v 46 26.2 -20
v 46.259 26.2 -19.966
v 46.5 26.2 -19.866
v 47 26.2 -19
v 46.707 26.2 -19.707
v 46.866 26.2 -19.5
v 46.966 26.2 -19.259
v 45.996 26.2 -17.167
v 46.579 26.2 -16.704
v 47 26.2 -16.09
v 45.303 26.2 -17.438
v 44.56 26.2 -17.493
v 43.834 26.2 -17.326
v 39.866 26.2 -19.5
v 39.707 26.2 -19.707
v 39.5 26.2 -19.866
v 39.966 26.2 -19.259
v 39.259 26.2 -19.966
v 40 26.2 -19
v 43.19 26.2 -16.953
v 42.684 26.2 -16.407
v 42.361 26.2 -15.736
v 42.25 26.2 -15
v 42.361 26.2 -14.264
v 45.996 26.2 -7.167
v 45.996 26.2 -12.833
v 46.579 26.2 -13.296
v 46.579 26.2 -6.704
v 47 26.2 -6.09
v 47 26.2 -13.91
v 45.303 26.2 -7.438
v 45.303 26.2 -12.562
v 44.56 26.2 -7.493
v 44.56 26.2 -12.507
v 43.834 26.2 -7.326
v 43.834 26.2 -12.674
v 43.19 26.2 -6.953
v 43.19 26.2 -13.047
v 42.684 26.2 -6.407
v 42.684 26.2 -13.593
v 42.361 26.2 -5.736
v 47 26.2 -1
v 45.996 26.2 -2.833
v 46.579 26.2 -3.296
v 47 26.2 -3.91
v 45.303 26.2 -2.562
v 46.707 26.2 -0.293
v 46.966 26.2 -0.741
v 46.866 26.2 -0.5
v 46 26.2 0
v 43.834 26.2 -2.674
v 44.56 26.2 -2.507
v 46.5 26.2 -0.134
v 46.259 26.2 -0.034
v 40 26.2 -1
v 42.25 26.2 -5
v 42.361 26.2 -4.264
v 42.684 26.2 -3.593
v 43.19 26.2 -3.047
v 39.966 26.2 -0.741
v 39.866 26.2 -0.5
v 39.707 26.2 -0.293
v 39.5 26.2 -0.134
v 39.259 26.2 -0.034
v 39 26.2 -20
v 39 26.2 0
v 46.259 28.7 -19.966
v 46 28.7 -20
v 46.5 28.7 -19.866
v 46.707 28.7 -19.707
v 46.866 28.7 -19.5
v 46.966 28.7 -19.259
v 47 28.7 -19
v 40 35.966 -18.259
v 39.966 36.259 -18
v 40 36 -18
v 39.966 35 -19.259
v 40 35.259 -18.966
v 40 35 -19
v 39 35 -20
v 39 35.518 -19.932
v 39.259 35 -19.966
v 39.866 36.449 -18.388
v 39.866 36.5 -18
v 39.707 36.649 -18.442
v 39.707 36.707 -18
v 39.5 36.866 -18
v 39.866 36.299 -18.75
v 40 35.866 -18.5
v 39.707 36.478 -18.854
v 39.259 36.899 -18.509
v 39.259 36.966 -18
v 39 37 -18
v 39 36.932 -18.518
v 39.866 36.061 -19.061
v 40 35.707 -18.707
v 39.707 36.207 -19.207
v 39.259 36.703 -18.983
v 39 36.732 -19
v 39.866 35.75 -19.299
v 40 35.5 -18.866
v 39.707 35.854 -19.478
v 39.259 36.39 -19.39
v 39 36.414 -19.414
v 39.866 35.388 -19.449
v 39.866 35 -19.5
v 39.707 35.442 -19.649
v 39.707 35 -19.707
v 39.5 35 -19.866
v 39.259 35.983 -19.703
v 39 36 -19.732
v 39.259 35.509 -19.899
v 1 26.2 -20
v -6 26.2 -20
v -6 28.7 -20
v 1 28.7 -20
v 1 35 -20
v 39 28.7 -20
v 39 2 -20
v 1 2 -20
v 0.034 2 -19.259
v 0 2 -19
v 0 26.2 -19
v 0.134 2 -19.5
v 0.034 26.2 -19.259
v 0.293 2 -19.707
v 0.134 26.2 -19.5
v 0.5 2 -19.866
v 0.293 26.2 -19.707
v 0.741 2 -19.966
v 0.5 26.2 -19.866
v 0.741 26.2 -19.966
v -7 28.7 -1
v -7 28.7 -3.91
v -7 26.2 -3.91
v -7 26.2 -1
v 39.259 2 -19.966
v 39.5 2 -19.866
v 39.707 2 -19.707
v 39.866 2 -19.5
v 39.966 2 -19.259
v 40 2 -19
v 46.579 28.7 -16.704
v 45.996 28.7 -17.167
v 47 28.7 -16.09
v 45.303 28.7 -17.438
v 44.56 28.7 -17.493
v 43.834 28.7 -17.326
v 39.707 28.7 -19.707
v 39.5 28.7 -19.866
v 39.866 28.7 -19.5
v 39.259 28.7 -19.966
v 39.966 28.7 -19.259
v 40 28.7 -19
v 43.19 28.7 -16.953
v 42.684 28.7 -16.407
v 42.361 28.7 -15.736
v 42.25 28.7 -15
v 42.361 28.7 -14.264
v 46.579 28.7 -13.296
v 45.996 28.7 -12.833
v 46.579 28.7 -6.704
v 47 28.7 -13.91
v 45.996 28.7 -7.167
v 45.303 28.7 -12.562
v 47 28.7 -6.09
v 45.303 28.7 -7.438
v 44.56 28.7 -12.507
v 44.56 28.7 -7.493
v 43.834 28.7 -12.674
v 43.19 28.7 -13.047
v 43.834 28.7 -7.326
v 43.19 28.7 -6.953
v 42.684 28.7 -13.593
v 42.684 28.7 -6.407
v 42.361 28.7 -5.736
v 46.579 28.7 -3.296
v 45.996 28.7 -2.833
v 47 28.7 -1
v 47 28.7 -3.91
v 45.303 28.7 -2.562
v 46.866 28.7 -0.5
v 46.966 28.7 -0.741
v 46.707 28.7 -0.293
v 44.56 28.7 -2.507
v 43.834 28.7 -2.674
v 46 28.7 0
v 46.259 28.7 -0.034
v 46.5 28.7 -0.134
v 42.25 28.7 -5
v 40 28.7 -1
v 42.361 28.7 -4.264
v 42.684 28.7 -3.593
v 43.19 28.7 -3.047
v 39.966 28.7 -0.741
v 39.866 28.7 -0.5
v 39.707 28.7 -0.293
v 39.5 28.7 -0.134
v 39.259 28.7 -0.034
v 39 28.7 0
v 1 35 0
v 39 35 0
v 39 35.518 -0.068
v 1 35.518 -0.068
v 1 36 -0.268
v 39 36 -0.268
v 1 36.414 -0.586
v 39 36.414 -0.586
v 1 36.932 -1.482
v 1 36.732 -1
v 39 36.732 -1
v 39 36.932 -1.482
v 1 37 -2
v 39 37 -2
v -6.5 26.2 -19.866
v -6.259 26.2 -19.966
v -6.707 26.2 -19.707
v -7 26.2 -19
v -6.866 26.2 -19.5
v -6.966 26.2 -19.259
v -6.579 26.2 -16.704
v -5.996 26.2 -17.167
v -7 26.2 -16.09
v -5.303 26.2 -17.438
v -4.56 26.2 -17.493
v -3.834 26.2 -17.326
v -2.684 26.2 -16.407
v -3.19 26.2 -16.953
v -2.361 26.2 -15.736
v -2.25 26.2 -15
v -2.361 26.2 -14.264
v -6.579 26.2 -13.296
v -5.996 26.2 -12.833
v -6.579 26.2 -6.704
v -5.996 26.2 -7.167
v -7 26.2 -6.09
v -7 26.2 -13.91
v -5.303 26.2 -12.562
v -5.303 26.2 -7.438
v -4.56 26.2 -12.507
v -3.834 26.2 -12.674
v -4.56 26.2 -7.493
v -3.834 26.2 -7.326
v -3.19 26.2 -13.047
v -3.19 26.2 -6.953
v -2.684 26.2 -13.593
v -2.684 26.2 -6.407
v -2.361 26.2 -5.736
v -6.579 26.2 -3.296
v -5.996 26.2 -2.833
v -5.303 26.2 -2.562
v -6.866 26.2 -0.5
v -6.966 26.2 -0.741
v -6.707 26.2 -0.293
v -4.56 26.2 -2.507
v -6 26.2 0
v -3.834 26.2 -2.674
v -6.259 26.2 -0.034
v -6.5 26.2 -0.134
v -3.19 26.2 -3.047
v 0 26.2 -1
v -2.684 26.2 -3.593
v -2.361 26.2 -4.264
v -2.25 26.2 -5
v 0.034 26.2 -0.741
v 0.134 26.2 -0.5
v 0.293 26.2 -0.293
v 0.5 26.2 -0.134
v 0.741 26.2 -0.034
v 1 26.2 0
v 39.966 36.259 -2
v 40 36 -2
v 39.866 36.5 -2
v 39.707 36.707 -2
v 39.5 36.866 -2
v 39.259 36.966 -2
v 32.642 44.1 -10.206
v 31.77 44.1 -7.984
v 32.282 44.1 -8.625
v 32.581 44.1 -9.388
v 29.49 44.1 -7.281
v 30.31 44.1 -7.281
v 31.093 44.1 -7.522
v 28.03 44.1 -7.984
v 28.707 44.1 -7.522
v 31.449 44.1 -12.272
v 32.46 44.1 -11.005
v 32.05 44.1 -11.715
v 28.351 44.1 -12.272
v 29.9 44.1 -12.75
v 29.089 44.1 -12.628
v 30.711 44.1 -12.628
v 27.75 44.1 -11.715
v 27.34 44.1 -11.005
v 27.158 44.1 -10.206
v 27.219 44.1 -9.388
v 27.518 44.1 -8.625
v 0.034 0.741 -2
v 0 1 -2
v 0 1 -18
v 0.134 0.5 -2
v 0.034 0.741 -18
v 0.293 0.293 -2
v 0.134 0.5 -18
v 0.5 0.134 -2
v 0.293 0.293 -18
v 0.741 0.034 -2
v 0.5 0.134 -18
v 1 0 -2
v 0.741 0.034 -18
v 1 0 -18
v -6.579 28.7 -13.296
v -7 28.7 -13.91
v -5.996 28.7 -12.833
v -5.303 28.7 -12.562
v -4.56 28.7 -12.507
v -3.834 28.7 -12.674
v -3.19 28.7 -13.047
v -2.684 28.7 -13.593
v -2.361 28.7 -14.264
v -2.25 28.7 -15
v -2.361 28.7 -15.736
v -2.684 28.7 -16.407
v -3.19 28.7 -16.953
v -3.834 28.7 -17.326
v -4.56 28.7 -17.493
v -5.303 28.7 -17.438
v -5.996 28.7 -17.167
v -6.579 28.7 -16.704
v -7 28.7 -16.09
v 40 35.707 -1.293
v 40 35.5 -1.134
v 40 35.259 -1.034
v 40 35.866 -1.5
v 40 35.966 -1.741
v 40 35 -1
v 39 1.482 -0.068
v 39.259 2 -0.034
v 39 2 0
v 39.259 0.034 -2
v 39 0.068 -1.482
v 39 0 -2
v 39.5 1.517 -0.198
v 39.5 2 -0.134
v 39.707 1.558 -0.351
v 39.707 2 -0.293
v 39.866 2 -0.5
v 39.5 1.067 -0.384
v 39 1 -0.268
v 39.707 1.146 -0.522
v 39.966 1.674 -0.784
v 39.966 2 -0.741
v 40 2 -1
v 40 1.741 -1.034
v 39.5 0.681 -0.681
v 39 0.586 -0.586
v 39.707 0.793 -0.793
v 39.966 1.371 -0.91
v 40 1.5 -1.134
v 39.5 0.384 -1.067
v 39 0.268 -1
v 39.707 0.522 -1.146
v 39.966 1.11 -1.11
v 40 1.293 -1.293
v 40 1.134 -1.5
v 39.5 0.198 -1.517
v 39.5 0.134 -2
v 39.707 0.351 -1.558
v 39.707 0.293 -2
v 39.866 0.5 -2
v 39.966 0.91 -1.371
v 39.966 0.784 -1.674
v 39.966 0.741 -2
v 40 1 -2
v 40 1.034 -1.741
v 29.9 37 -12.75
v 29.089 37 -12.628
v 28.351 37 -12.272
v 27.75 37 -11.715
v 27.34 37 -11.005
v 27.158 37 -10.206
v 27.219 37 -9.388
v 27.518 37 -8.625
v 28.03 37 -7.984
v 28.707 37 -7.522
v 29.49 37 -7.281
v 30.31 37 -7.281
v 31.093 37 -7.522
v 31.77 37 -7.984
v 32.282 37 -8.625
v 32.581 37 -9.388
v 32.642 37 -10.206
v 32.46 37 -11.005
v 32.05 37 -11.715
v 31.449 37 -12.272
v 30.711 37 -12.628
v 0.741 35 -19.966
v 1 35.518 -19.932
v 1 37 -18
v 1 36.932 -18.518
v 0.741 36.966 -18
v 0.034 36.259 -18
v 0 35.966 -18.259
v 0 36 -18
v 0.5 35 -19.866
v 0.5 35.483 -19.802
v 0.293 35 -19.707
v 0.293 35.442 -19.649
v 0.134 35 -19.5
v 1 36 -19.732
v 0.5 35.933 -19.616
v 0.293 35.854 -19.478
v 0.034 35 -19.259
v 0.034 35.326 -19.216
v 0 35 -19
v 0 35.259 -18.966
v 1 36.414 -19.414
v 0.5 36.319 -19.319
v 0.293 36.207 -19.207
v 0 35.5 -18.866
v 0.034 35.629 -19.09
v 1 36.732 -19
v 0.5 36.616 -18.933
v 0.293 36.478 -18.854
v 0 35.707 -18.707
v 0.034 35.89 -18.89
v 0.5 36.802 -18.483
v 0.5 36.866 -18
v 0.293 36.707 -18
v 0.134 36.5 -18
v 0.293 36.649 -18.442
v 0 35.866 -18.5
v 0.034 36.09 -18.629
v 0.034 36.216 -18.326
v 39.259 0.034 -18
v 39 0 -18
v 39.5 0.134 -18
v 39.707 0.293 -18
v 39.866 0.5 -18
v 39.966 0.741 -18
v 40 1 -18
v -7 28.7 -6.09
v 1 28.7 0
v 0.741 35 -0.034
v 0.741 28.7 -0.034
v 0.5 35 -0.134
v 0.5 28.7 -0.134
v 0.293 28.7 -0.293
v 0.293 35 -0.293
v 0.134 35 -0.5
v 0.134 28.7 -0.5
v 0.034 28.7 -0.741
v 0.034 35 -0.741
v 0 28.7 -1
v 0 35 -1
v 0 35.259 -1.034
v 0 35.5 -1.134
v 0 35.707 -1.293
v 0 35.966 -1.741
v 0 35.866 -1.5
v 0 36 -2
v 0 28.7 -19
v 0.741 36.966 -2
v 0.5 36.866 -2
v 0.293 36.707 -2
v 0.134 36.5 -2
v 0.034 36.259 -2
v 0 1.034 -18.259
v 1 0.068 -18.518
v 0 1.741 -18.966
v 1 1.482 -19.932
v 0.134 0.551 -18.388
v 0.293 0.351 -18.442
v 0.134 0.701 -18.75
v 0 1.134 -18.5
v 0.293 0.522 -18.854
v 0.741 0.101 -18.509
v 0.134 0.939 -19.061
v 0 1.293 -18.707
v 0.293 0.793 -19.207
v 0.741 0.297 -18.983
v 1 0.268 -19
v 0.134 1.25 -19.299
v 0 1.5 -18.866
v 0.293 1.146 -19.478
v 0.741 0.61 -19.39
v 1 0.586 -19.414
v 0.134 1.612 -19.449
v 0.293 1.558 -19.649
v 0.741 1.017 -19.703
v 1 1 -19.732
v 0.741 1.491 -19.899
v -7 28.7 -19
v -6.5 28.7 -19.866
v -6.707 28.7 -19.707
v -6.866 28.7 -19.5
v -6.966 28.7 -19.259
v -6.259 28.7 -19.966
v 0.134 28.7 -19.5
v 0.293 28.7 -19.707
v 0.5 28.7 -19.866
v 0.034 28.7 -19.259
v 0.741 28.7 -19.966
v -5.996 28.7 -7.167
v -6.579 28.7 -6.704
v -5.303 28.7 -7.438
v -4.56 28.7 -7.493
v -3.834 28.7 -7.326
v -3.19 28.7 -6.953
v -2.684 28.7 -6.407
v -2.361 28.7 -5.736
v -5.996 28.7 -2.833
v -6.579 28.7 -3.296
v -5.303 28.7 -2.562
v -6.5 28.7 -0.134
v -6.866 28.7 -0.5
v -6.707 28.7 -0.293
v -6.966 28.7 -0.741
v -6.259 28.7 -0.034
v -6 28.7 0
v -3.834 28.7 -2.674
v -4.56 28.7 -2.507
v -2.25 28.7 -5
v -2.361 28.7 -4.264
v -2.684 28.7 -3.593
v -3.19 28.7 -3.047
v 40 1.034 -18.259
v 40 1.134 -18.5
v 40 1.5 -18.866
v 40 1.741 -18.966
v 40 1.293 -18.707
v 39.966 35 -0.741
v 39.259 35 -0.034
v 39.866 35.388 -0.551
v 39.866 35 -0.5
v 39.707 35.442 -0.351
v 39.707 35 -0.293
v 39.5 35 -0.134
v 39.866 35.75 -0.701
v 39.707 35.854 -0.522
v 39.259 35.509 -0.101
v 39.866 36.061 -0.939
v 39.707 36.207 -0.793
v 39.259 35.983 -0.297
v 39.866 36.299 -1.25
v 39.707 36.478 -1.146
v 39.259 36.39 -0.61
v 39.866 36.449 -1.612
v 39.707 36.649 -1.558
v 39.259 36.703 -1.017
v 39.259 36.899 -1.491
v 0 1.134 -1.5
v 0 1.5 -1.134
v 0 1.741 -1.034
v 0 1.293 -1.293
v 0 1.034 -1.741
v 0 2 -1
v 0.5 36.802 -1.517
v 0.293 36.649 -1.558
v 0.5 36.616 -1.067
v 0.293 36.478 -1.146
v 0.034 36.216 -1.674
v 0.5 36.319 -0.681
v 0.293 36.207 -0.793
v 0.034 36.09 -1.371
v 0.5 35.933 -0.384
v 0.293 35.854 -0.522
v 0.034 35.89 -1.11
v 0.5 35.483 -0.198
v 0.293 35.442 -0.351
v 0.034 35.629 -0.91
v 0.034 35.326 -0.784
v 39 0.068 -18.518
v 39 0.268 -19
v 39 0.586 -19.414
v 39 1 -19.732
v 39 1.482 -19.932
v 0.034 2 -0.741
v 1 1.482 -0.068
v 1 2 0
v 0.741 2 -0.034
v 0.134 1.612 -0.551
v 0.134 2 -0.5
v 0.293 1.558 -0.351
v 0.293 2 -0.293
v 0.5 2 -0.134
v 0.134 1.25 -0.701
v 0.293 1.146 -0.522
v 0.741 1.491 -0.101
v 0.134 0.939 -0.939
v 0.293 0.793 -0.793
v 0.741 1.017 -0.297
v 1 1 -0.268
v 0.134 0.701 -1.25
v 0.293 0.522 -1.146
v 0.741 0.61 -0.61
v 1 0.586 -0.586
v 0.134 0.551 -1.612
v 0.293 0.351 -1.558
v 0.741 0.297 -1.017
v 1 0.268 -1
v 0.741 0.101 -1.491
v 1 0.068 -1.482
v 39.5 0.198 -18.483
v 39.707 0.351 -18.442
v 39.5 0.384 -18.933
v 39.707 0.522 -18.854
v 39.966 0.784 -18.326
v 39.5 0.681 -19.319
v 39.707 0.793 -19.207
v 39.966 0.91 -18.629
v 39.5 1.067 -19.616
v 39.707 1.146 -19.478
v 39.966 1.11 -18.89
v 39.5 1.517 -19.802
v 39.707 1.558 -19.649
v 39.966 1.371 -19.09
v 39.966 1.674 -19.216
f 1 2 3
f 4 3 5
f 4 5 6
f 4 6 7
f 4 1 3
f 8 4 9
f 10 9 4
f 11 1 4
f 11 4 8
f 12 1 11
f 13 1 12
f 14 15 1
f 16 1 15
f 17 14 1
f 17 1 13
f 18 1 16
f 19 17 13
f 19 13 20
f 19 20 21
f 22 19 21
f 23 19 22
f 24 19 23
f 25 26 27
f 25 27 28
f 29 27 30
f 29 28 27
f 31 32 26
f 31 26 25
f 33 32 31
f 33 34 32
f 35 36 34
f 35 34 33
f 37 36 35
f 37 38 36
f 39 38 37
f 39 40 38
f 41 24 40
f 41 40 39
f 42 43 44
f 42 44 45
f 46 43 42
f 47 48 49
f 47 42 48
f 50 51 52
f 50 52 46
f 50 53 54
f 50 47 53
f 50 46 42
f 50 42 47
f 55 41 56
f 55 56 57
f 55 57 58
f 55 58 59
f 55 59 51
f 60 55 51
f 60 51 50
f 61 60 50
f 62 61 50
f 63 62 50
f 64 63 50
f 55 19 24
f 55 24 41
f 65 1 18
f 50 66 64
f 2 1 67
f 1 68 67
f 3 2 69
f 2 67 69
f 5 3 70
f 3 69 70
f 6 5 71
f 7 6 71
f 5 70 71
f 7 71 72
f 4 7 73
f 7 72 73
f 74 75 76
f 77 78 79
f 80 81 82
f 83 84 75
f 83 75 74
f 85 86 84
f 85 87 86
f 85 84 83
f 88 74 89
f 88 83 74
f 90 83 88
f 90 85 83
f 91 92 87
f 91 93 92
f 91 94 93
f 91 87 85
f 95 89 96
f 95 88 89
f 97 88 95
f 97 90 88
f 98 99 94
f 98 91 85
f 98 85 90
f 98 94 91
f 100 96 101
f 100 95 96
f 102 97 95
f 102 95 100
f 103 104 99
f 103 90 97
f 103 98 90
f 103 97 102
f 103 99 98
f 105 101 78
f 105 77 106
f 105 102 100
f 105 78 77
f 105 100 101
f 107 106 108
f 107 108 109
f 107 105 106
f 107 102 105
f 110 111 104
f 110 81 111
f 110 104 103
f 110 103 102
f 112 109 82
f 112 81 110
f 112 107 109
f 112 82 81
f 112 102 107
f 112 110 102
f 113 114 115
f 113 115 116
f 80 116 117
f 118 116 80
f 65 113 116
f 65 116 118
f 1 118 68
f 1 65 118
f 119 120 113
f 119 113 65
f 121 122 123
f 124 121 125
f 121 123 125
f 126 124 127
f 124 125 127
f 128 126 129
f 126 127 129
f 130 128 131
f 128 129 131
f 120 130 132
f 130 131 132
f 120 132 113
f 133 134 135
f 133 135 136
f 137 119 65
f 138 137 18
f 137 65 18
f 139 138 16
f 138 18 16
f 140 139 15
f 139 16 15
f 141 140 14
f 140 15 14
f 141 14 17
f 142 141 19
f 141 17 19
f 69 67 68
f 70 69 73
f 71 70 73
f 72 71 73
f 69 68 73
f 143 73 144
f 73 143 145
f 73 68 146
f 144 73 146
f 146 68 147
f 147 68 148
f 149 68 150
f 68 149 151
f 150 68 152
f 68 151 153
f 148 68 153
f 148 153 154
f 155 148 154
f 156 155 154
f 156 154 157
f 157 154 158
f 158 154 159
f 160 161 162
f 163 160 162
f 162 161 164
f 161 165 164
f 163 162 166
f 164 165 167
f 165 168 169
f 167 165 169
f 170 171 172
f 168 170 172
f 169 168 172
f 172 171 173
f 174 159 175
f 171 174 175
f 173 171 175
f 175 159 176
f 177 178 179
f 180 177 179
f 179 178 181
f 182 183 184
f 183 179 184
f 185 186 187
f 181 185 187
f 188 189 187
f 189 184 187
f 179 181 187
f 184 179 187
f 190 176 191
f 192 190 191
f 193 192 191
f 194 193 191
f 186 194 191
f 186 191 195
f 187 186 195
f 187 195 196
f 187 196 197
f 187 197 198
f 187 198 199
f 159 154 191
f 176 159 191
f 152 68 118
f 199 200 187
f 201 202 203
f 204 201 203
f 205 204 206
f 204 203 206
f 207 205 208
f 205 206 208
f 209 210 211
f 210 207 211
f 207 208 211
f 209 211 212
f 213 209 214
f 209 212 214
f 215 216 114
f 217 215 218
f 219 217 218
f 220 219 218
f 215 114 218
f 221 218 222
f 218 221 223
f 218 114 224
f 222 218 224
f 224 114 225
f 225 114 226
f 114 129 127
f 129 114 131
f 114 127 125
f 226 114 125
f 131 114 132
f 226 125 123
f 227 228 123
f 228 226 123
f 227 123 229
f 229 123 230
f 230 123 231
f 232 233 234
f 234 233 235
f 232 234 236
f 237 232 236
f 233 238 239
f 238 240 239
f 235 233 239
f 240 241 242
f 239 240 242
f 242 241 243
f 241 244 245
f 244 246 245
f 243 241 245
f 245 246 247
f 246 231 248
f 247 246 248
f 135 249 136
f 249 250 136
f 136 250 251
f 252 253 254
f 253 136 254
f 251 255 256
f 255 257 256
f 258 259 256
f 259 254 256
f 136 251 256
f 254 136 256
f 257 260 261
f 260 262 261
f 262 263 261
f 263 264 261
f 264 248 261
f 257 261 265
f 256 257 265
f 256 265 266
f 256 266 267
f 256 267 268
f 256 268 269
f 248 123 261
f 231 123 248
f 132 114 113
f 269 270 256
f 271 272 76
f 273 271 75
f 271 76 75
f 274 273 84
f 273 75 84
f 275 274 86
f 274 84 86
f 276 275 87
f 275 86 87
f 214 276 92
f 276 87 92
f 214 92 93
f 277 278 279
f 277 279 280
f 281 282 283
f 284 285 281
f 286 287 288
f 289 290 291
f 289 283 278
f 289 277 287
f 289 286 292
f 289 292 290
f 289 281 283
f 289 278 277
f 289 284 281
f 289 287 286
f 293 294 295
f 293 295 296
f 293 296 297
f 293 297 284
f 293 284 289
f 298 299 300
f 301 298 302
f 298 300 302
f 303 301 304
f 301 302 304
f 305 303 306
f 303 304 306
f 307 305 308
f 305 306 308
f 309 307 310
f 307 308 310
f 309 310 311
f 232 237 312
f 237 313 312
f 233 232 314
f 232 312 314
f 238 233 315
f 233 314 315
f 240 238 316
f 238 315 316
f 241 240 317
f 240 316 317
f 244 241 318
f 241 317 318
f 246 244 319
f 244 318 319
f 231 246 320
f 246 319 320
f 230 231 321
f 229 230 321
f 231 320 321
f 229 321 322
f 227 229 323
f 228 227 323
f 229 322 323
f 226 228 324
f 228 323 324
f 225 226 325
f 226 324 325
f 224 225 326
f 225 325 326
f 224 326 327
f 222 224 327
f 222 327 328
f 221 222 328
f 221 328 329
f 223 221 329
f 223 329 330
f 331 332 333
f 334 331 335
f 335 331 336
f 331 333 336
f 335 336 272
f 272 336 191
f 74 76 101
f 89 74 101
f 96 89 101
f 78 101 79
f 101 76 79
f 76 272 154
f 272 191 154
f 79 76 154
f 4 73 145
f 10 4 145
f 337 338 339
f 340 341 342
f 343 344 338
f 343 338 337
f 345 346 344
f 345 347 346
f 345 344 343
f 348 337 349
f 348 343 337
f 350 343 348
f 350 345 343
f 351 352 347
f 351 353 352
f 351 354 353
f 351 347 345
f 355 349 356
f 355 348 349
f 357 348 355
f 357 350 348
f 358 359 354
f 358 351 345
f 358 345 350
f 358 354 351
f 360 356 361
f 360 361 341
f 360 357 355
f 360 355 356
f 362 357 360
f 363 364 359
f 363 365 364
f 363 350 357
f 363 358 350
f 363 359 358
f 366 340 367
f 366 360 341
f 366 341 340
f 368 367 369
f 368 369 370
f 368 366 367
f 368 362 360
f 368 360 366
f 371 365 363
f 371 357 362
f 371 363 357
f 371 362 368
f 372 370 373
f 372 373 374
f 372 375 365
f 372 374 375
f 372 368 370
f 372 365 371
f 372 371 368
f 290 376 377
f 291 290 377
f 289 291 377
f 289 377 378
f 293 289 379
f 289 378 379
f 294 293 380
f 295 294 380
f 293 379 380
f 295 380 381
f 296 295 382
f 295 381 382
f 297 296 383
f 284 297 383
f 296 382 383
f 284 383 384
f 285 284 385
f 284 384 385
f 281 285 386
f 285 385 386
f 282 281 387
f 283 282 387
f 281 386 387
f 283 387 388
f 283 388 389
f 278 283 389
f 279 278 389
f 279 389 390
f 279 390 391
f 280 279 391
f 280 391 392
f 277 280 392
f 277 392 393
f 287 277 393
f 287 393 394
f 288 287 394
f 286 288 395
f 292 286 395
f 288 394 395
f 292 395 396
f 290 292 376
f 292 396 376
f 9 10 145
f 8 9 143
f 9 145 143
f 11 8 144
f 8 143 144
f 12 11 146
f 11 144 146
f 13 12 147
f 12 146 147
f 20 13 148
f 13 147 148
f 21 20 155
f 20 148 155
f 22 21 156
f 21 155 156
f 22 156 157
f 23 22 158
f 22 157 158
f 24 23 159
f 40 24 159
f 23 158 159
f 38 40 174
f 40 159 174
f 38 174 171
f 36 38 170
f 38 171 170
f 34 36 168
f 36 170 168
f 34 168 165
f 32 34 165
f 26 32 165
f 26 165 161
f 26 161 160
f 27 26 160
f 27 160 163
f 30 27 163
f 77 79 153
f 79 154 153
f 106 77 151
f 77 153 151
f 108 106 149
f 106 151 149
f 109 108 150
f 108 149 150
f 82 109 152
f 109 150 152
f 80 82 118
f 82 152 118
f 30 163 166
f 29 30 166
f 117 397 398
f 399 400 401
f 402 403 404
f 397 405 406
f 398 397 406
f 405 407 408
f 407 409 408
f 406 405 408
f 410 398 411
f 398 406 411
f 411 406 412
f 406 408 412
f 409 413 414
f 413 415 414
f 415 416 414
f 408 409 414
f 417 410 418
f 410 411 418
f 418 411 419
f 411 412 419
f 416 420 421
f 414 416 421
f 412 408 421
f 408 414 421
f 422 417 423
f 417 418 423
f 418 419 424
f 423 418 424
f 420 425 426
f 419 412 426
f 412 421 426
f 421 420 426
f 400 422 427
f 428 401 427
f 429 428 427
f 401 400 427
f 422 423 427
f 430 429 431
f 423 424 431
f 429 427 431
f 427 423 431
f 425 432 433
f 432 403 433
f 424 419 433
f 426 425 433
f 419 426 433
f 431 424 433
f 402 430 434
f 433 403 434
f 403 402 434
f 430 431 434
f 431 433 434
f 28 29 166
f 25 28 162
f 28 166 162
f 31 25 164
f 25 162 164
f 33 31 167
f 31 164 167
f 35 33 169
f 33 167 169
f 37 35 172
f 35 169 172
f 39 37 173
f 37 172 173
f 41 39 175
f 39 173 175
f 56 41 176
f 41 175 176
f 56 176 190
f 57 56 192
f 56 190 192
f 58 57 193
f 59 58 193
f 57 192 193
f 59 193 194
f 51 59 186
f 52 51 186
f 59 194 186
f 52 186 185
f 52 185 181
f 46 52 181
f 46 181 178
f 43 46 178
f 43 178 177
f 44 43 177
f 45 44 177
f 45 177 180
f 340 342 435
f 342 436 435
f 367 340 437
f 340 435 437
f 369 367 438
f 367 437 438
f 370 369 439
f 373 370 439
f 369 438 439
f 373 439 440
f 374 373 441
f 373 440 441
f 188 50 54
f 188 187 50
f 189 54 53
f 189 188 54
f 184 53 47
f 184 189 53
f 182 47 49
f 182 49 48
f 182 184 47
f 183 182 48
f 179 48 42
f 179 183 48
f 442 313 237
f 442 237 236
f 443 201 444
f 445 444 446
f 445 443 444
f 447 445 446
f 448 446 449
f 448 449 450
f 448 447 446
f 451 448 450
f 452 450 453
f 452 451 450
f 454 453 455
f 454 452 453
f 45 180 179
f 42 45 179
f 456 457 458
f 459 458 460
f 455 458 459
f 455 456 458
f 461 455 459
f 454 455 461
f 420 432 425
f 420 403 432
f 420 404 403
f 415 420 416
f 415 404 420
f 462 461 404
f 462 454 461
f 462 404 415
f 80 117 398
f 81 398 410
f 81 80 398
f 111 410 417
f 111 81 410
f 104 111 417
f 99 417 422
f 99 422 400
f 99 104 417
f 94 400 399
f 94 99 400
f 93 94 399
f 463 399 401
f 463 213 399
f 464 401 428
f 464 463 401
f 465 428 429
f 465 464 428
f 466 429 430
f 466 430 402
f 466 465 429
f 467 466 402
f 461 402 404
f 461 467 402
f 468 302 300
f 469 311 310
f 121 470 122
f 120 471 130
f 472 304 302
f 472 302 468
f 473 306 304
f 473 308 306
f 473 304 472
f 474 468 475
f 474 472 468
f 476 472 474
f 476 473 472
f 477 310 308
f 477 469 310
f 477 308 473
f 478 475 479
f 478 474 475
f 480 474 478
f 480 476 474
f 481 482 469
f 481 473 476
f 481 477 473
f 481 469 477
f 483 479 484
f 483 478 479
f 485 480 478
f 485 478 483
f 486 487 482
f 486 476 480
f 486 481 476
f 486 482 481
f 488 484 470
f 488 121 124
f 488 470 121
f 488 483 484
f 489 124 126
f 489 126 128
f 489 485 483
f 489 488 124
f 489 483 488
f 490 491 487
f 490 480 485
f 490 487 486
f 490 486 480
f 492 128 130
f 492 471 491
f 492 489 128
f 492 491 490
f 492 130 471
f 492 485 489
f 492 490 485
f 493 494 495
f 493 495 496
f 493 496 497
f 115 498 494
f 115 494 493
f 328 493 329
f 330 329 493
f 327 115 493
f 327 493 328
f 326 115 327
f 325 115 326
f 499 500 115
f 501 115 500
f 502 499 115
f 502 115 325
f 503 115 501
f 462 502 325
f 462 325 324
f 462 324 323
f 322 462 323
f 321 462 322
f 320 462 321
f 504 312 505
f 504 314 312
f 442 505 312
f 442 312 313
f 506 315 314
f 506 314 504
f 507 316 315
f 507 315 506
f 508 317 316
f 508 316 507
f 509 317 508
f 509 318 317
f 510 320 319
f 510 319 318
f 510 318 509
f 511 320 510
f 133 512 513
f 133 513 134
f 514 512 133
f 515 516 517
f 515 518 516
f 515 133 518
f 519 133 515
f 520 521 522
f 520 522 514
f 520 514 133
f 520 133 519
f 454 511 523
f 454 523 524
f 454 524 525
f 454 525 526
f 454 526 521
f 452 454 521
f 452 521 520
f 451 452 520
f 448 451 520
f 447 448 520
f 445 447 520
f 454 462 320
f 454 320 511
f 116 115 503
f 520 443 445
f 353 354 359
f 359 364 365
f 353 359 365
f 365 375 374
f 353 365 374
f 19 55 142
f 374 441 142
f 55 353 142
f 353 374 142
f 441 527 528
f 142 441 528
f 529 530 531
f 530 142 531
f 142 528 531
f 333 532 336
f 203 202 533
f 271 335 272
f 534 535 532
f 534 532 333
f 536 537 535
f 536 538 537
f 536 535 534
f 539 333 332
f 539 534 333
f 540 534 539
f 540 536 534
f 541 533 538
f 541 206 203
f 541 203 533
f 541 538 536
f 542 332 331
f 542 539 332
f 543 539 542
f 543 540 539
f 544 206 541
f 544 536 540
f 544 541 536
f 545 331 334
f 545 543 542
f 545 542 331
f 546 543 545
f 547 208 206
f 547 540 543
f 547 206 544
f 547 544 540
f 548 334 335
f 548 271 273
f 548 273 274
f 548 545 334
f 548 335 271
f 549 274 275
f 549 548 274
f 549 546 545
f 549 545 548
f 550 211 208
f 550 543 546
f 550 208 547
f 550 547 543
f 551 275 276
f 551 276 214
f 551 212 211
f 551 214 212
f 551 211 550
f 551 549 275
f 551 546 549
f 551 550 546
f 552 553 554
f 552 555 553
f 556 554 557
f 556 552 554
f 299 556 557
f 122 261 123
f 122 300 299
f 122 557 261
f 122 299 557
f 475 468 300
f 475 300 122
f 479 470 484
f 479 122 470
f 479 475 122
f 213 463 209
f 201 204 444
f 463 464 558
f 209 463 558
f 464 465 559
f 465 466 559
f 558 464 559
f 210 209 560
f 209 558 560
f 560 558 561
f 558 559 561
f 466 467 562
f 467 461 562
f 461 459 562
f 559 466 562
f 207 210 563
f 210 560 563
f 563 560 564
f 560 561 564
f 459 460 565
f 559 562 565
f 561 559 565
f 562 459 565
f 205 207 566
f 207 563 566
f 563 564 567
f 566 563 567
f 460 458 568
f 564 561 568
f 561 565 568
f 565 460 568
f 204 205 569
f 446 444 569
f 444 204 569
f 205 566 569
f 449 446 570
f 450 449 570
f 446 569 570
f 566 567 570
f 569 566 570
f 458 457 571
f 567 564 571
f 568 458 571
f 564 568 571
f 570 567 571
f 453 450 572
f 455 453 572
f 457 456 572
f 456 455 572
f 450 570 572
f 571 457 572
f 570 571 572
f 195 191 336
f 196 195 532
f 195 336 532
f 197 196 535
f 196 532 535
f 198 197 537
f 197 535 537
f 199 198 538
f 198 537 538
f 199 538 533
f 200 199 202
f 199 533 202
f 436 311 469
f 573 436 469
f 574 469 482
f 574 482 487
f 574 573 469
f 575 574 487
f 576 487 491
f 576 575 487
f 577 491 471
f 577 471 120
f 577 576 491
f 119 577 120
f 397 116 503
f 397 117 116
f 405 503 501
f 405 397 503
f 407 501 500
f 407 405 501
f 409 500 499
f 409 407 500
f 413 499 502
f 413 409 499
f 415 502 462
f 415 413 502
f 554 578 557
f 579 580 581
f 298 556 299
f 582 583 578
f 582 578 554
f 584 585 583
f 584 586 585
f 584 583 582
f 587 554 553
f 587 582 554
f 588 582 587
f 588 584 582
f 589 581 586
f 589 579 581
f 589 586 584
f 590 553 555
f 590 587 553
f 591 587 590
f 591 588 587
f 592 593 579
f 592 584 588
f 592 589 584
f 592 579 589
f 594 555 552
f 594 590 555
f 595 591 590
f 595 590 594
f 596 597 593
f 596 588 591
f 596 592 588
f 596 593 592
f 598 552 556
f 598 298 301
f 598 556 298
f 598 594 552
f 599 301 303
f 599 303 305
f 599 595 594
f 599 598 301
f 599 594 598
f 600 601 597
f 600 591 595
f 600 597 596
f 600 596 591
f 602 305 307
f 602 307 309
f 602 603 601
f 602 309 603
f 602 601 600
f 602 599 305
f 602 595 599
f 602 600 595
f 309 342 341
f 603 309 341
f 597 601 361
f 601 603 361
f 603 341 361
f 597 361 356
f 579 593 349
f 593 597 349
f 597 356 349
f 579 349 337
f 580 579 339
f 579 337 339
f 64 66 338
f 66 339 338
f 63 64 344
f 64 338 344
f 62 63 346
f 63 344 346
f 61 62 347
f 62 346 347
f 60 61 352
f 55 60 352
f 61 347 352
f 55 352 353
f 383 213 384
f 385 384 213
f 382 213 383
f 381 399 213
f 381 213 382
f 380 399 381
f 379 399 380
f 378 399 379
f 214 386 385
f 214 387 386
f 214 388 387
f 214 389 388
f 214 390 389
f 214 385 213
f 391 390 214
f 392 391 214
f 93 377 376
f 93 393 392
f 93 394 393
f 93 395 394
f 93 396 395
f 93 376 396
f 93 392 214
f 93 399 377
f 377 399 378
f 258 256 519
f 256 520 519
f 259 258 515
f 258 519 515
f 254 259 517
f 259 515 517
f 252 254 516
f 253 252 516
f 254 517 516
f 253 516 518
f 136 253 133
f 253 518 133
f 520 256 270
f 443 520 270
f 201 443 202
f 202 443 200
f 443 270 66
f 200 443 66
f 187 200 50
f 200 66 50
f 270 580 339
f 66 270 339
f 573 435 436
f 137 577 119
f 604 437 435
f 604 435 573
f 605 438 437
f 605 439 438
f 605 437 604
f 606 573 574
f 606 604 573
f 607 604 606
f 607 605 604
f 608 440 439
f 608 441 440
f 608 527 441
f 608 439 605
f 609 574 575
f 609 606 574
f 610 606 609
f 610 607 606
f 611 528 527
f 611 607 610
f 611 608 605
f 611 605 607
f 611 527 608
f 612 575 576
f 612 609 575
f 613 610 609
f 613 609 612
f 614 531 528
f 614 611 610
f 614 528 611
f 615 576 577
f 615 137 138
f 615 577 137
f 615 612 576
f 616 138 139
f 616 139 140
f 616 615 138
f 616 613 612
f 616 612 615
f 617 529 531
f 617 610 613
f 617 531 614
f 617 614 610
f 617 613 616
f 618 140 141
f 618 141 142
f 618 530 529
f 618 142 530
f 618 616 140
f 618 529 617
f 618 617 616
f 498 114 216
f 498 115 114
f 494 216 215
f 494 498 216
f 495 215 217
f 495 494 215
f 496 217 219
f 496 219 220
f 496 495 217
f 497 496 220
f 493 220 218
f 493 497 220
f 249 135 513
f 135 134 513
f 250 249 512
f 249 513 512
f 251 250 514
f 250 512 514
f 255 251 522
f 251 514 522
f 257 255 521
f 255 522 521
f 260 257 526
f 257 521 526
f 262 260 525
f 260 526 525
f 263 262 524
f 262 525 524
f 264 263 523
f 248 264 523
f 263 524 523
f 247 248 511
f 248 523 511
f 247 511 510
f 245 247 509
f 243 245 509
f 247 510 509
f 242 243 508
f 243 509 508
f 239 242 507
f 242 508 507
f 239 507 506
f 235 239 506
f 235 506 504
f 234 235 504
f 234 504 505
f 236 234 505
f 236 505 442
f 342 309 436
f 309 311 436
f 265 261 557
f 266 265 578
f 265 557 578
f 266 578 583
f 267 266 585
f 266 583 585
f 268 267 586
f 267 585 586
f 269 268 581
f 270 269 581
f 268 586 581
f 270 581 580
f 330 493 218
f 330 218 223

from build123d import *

# Parameters (mm, degrees)
SKETCH2_W           = 40
SKETCH2_H           = 20
BOSS_EXTRUDE1_DEPTH = 37
SKETCH3_W           = 20
SKETCH3_H           = 2.5
BOSS_EXTRUDE2_DEPTH = 7
SKETCH4_R           = 2.5
CUT_EXTRUDE5_DEPTH  = 7.25
SKETCH5_R           = 2.75
BOSS_EXTRUDE4_DEPTH = 7.1
FILLET1_R           = 2
FILLET2_R           = 1


with BuildPart() as part:
    # Sketch2 → Boss-Extrude1 (new body)
    with BuildSketch(Plane(origin=(0, 0, 0), x_dir=(1, 0, 0), z_dir=(0, 1, 0))):
        with Locations((20, 10)):
            Rectangle(SKETCH2_W, SKETCH2_H)
    extrude(amount=BOSS_EXTRUDE1_DEPTH)

    # Sketch3 → Boss-Extrude2 (add)
    with BuildSketch(Plane.ZY):
        with Locations((-10, 27.45)):
            Rectangle(SKETCH3_W, SKETCH3_H)
    boss_extrude2 = extrude(amount=BOSS_EXTRUDE2_DEPTH)

    # Mirror1: Boss-Extrude2 across plane
    add(boss_extrude2.mirror(Plane.ZY.offset(-20)))

    # Sketch4 → Cut-Extrude5 (cut)
    with BuildSketch(Plane(origin=(0, 28.7, 0), x_dir=(1, 0, 0), z_dir=(0, 1, 0))):
        with Locations((-4.75, 15)):
            Circle(SKETCH4_R)
        with Locations((-4.75, 5)):
            Circle(SKETCH4_R)
        with Locations((44.75, 5)):
            Circle(SKETCH4_R)
        with Locations((44.75, 15)):
            Circle(SKETCH4_R)
    extrude(amount=-CUT_EXTRUDE5_DEPTH, mode=Mode.SUBTRACT)

    # Sketch5 → Boss-Extrude4 (add)
    with BuildSketch(Plane(origin=(0, 37, 0), x_dir=(1, 0, 0), z_dir=(0, 1, 0))):
        with Locations(Location((29.9, 10, 0), (0, 0, 90))):
            Circle(SKETCH5_R)
    extrude(amount=BOSS_EXTRUDE4_DEPTH)

    # Fillet1
    fillet1_edges = [part.edges().sort_by_distance(p)[0] for p in [
        (20, 37, -20),
        (20, 0, -20),
        (20, 0, 0),
        (20, 37, 0),
    ]]
    fillet(fillet1_edges, radius=FILLET1_R)

    # Fillet2
    fillet2_edges = [part.edges().sort_by_distance(p)[0] for p in [
        (0, 31.85, -20),
        (0, 36.414213562, -19.414213562),
        (0, 36.414213562, -0.585786438),
        (40, 0, -10),
        (40, 0.585786438, -19.414213562),
        (40, 0.585786438, -0.585786438),
        (0, 0, -10),
        (0, 0.585786438, -19.414213562),
        (0, 0.585786438, -0.585786438),
        (0, 14.1, 0),
        (0, 14.1, -20),
        (-7, 27.45, -20),
        (-7, 27.45, 0),
        (40, 14.1, -20),
        (40, 14.1, 0),
        (47, 27.45, -20),
        (47, 27.45, 0),
        (0, 37, -10),
        (40, 37, -10),
        (40, 31.85, 0),
        (40, 31.85, -20),
        (40, 36.414213562, -19.414213562),
        (40, 36.414213562, -0.585786438),
        (0, 31.85, 0),
    ]]
    fillet(fillet2_edges, radius=FILLET2_R)


solid = part.part
